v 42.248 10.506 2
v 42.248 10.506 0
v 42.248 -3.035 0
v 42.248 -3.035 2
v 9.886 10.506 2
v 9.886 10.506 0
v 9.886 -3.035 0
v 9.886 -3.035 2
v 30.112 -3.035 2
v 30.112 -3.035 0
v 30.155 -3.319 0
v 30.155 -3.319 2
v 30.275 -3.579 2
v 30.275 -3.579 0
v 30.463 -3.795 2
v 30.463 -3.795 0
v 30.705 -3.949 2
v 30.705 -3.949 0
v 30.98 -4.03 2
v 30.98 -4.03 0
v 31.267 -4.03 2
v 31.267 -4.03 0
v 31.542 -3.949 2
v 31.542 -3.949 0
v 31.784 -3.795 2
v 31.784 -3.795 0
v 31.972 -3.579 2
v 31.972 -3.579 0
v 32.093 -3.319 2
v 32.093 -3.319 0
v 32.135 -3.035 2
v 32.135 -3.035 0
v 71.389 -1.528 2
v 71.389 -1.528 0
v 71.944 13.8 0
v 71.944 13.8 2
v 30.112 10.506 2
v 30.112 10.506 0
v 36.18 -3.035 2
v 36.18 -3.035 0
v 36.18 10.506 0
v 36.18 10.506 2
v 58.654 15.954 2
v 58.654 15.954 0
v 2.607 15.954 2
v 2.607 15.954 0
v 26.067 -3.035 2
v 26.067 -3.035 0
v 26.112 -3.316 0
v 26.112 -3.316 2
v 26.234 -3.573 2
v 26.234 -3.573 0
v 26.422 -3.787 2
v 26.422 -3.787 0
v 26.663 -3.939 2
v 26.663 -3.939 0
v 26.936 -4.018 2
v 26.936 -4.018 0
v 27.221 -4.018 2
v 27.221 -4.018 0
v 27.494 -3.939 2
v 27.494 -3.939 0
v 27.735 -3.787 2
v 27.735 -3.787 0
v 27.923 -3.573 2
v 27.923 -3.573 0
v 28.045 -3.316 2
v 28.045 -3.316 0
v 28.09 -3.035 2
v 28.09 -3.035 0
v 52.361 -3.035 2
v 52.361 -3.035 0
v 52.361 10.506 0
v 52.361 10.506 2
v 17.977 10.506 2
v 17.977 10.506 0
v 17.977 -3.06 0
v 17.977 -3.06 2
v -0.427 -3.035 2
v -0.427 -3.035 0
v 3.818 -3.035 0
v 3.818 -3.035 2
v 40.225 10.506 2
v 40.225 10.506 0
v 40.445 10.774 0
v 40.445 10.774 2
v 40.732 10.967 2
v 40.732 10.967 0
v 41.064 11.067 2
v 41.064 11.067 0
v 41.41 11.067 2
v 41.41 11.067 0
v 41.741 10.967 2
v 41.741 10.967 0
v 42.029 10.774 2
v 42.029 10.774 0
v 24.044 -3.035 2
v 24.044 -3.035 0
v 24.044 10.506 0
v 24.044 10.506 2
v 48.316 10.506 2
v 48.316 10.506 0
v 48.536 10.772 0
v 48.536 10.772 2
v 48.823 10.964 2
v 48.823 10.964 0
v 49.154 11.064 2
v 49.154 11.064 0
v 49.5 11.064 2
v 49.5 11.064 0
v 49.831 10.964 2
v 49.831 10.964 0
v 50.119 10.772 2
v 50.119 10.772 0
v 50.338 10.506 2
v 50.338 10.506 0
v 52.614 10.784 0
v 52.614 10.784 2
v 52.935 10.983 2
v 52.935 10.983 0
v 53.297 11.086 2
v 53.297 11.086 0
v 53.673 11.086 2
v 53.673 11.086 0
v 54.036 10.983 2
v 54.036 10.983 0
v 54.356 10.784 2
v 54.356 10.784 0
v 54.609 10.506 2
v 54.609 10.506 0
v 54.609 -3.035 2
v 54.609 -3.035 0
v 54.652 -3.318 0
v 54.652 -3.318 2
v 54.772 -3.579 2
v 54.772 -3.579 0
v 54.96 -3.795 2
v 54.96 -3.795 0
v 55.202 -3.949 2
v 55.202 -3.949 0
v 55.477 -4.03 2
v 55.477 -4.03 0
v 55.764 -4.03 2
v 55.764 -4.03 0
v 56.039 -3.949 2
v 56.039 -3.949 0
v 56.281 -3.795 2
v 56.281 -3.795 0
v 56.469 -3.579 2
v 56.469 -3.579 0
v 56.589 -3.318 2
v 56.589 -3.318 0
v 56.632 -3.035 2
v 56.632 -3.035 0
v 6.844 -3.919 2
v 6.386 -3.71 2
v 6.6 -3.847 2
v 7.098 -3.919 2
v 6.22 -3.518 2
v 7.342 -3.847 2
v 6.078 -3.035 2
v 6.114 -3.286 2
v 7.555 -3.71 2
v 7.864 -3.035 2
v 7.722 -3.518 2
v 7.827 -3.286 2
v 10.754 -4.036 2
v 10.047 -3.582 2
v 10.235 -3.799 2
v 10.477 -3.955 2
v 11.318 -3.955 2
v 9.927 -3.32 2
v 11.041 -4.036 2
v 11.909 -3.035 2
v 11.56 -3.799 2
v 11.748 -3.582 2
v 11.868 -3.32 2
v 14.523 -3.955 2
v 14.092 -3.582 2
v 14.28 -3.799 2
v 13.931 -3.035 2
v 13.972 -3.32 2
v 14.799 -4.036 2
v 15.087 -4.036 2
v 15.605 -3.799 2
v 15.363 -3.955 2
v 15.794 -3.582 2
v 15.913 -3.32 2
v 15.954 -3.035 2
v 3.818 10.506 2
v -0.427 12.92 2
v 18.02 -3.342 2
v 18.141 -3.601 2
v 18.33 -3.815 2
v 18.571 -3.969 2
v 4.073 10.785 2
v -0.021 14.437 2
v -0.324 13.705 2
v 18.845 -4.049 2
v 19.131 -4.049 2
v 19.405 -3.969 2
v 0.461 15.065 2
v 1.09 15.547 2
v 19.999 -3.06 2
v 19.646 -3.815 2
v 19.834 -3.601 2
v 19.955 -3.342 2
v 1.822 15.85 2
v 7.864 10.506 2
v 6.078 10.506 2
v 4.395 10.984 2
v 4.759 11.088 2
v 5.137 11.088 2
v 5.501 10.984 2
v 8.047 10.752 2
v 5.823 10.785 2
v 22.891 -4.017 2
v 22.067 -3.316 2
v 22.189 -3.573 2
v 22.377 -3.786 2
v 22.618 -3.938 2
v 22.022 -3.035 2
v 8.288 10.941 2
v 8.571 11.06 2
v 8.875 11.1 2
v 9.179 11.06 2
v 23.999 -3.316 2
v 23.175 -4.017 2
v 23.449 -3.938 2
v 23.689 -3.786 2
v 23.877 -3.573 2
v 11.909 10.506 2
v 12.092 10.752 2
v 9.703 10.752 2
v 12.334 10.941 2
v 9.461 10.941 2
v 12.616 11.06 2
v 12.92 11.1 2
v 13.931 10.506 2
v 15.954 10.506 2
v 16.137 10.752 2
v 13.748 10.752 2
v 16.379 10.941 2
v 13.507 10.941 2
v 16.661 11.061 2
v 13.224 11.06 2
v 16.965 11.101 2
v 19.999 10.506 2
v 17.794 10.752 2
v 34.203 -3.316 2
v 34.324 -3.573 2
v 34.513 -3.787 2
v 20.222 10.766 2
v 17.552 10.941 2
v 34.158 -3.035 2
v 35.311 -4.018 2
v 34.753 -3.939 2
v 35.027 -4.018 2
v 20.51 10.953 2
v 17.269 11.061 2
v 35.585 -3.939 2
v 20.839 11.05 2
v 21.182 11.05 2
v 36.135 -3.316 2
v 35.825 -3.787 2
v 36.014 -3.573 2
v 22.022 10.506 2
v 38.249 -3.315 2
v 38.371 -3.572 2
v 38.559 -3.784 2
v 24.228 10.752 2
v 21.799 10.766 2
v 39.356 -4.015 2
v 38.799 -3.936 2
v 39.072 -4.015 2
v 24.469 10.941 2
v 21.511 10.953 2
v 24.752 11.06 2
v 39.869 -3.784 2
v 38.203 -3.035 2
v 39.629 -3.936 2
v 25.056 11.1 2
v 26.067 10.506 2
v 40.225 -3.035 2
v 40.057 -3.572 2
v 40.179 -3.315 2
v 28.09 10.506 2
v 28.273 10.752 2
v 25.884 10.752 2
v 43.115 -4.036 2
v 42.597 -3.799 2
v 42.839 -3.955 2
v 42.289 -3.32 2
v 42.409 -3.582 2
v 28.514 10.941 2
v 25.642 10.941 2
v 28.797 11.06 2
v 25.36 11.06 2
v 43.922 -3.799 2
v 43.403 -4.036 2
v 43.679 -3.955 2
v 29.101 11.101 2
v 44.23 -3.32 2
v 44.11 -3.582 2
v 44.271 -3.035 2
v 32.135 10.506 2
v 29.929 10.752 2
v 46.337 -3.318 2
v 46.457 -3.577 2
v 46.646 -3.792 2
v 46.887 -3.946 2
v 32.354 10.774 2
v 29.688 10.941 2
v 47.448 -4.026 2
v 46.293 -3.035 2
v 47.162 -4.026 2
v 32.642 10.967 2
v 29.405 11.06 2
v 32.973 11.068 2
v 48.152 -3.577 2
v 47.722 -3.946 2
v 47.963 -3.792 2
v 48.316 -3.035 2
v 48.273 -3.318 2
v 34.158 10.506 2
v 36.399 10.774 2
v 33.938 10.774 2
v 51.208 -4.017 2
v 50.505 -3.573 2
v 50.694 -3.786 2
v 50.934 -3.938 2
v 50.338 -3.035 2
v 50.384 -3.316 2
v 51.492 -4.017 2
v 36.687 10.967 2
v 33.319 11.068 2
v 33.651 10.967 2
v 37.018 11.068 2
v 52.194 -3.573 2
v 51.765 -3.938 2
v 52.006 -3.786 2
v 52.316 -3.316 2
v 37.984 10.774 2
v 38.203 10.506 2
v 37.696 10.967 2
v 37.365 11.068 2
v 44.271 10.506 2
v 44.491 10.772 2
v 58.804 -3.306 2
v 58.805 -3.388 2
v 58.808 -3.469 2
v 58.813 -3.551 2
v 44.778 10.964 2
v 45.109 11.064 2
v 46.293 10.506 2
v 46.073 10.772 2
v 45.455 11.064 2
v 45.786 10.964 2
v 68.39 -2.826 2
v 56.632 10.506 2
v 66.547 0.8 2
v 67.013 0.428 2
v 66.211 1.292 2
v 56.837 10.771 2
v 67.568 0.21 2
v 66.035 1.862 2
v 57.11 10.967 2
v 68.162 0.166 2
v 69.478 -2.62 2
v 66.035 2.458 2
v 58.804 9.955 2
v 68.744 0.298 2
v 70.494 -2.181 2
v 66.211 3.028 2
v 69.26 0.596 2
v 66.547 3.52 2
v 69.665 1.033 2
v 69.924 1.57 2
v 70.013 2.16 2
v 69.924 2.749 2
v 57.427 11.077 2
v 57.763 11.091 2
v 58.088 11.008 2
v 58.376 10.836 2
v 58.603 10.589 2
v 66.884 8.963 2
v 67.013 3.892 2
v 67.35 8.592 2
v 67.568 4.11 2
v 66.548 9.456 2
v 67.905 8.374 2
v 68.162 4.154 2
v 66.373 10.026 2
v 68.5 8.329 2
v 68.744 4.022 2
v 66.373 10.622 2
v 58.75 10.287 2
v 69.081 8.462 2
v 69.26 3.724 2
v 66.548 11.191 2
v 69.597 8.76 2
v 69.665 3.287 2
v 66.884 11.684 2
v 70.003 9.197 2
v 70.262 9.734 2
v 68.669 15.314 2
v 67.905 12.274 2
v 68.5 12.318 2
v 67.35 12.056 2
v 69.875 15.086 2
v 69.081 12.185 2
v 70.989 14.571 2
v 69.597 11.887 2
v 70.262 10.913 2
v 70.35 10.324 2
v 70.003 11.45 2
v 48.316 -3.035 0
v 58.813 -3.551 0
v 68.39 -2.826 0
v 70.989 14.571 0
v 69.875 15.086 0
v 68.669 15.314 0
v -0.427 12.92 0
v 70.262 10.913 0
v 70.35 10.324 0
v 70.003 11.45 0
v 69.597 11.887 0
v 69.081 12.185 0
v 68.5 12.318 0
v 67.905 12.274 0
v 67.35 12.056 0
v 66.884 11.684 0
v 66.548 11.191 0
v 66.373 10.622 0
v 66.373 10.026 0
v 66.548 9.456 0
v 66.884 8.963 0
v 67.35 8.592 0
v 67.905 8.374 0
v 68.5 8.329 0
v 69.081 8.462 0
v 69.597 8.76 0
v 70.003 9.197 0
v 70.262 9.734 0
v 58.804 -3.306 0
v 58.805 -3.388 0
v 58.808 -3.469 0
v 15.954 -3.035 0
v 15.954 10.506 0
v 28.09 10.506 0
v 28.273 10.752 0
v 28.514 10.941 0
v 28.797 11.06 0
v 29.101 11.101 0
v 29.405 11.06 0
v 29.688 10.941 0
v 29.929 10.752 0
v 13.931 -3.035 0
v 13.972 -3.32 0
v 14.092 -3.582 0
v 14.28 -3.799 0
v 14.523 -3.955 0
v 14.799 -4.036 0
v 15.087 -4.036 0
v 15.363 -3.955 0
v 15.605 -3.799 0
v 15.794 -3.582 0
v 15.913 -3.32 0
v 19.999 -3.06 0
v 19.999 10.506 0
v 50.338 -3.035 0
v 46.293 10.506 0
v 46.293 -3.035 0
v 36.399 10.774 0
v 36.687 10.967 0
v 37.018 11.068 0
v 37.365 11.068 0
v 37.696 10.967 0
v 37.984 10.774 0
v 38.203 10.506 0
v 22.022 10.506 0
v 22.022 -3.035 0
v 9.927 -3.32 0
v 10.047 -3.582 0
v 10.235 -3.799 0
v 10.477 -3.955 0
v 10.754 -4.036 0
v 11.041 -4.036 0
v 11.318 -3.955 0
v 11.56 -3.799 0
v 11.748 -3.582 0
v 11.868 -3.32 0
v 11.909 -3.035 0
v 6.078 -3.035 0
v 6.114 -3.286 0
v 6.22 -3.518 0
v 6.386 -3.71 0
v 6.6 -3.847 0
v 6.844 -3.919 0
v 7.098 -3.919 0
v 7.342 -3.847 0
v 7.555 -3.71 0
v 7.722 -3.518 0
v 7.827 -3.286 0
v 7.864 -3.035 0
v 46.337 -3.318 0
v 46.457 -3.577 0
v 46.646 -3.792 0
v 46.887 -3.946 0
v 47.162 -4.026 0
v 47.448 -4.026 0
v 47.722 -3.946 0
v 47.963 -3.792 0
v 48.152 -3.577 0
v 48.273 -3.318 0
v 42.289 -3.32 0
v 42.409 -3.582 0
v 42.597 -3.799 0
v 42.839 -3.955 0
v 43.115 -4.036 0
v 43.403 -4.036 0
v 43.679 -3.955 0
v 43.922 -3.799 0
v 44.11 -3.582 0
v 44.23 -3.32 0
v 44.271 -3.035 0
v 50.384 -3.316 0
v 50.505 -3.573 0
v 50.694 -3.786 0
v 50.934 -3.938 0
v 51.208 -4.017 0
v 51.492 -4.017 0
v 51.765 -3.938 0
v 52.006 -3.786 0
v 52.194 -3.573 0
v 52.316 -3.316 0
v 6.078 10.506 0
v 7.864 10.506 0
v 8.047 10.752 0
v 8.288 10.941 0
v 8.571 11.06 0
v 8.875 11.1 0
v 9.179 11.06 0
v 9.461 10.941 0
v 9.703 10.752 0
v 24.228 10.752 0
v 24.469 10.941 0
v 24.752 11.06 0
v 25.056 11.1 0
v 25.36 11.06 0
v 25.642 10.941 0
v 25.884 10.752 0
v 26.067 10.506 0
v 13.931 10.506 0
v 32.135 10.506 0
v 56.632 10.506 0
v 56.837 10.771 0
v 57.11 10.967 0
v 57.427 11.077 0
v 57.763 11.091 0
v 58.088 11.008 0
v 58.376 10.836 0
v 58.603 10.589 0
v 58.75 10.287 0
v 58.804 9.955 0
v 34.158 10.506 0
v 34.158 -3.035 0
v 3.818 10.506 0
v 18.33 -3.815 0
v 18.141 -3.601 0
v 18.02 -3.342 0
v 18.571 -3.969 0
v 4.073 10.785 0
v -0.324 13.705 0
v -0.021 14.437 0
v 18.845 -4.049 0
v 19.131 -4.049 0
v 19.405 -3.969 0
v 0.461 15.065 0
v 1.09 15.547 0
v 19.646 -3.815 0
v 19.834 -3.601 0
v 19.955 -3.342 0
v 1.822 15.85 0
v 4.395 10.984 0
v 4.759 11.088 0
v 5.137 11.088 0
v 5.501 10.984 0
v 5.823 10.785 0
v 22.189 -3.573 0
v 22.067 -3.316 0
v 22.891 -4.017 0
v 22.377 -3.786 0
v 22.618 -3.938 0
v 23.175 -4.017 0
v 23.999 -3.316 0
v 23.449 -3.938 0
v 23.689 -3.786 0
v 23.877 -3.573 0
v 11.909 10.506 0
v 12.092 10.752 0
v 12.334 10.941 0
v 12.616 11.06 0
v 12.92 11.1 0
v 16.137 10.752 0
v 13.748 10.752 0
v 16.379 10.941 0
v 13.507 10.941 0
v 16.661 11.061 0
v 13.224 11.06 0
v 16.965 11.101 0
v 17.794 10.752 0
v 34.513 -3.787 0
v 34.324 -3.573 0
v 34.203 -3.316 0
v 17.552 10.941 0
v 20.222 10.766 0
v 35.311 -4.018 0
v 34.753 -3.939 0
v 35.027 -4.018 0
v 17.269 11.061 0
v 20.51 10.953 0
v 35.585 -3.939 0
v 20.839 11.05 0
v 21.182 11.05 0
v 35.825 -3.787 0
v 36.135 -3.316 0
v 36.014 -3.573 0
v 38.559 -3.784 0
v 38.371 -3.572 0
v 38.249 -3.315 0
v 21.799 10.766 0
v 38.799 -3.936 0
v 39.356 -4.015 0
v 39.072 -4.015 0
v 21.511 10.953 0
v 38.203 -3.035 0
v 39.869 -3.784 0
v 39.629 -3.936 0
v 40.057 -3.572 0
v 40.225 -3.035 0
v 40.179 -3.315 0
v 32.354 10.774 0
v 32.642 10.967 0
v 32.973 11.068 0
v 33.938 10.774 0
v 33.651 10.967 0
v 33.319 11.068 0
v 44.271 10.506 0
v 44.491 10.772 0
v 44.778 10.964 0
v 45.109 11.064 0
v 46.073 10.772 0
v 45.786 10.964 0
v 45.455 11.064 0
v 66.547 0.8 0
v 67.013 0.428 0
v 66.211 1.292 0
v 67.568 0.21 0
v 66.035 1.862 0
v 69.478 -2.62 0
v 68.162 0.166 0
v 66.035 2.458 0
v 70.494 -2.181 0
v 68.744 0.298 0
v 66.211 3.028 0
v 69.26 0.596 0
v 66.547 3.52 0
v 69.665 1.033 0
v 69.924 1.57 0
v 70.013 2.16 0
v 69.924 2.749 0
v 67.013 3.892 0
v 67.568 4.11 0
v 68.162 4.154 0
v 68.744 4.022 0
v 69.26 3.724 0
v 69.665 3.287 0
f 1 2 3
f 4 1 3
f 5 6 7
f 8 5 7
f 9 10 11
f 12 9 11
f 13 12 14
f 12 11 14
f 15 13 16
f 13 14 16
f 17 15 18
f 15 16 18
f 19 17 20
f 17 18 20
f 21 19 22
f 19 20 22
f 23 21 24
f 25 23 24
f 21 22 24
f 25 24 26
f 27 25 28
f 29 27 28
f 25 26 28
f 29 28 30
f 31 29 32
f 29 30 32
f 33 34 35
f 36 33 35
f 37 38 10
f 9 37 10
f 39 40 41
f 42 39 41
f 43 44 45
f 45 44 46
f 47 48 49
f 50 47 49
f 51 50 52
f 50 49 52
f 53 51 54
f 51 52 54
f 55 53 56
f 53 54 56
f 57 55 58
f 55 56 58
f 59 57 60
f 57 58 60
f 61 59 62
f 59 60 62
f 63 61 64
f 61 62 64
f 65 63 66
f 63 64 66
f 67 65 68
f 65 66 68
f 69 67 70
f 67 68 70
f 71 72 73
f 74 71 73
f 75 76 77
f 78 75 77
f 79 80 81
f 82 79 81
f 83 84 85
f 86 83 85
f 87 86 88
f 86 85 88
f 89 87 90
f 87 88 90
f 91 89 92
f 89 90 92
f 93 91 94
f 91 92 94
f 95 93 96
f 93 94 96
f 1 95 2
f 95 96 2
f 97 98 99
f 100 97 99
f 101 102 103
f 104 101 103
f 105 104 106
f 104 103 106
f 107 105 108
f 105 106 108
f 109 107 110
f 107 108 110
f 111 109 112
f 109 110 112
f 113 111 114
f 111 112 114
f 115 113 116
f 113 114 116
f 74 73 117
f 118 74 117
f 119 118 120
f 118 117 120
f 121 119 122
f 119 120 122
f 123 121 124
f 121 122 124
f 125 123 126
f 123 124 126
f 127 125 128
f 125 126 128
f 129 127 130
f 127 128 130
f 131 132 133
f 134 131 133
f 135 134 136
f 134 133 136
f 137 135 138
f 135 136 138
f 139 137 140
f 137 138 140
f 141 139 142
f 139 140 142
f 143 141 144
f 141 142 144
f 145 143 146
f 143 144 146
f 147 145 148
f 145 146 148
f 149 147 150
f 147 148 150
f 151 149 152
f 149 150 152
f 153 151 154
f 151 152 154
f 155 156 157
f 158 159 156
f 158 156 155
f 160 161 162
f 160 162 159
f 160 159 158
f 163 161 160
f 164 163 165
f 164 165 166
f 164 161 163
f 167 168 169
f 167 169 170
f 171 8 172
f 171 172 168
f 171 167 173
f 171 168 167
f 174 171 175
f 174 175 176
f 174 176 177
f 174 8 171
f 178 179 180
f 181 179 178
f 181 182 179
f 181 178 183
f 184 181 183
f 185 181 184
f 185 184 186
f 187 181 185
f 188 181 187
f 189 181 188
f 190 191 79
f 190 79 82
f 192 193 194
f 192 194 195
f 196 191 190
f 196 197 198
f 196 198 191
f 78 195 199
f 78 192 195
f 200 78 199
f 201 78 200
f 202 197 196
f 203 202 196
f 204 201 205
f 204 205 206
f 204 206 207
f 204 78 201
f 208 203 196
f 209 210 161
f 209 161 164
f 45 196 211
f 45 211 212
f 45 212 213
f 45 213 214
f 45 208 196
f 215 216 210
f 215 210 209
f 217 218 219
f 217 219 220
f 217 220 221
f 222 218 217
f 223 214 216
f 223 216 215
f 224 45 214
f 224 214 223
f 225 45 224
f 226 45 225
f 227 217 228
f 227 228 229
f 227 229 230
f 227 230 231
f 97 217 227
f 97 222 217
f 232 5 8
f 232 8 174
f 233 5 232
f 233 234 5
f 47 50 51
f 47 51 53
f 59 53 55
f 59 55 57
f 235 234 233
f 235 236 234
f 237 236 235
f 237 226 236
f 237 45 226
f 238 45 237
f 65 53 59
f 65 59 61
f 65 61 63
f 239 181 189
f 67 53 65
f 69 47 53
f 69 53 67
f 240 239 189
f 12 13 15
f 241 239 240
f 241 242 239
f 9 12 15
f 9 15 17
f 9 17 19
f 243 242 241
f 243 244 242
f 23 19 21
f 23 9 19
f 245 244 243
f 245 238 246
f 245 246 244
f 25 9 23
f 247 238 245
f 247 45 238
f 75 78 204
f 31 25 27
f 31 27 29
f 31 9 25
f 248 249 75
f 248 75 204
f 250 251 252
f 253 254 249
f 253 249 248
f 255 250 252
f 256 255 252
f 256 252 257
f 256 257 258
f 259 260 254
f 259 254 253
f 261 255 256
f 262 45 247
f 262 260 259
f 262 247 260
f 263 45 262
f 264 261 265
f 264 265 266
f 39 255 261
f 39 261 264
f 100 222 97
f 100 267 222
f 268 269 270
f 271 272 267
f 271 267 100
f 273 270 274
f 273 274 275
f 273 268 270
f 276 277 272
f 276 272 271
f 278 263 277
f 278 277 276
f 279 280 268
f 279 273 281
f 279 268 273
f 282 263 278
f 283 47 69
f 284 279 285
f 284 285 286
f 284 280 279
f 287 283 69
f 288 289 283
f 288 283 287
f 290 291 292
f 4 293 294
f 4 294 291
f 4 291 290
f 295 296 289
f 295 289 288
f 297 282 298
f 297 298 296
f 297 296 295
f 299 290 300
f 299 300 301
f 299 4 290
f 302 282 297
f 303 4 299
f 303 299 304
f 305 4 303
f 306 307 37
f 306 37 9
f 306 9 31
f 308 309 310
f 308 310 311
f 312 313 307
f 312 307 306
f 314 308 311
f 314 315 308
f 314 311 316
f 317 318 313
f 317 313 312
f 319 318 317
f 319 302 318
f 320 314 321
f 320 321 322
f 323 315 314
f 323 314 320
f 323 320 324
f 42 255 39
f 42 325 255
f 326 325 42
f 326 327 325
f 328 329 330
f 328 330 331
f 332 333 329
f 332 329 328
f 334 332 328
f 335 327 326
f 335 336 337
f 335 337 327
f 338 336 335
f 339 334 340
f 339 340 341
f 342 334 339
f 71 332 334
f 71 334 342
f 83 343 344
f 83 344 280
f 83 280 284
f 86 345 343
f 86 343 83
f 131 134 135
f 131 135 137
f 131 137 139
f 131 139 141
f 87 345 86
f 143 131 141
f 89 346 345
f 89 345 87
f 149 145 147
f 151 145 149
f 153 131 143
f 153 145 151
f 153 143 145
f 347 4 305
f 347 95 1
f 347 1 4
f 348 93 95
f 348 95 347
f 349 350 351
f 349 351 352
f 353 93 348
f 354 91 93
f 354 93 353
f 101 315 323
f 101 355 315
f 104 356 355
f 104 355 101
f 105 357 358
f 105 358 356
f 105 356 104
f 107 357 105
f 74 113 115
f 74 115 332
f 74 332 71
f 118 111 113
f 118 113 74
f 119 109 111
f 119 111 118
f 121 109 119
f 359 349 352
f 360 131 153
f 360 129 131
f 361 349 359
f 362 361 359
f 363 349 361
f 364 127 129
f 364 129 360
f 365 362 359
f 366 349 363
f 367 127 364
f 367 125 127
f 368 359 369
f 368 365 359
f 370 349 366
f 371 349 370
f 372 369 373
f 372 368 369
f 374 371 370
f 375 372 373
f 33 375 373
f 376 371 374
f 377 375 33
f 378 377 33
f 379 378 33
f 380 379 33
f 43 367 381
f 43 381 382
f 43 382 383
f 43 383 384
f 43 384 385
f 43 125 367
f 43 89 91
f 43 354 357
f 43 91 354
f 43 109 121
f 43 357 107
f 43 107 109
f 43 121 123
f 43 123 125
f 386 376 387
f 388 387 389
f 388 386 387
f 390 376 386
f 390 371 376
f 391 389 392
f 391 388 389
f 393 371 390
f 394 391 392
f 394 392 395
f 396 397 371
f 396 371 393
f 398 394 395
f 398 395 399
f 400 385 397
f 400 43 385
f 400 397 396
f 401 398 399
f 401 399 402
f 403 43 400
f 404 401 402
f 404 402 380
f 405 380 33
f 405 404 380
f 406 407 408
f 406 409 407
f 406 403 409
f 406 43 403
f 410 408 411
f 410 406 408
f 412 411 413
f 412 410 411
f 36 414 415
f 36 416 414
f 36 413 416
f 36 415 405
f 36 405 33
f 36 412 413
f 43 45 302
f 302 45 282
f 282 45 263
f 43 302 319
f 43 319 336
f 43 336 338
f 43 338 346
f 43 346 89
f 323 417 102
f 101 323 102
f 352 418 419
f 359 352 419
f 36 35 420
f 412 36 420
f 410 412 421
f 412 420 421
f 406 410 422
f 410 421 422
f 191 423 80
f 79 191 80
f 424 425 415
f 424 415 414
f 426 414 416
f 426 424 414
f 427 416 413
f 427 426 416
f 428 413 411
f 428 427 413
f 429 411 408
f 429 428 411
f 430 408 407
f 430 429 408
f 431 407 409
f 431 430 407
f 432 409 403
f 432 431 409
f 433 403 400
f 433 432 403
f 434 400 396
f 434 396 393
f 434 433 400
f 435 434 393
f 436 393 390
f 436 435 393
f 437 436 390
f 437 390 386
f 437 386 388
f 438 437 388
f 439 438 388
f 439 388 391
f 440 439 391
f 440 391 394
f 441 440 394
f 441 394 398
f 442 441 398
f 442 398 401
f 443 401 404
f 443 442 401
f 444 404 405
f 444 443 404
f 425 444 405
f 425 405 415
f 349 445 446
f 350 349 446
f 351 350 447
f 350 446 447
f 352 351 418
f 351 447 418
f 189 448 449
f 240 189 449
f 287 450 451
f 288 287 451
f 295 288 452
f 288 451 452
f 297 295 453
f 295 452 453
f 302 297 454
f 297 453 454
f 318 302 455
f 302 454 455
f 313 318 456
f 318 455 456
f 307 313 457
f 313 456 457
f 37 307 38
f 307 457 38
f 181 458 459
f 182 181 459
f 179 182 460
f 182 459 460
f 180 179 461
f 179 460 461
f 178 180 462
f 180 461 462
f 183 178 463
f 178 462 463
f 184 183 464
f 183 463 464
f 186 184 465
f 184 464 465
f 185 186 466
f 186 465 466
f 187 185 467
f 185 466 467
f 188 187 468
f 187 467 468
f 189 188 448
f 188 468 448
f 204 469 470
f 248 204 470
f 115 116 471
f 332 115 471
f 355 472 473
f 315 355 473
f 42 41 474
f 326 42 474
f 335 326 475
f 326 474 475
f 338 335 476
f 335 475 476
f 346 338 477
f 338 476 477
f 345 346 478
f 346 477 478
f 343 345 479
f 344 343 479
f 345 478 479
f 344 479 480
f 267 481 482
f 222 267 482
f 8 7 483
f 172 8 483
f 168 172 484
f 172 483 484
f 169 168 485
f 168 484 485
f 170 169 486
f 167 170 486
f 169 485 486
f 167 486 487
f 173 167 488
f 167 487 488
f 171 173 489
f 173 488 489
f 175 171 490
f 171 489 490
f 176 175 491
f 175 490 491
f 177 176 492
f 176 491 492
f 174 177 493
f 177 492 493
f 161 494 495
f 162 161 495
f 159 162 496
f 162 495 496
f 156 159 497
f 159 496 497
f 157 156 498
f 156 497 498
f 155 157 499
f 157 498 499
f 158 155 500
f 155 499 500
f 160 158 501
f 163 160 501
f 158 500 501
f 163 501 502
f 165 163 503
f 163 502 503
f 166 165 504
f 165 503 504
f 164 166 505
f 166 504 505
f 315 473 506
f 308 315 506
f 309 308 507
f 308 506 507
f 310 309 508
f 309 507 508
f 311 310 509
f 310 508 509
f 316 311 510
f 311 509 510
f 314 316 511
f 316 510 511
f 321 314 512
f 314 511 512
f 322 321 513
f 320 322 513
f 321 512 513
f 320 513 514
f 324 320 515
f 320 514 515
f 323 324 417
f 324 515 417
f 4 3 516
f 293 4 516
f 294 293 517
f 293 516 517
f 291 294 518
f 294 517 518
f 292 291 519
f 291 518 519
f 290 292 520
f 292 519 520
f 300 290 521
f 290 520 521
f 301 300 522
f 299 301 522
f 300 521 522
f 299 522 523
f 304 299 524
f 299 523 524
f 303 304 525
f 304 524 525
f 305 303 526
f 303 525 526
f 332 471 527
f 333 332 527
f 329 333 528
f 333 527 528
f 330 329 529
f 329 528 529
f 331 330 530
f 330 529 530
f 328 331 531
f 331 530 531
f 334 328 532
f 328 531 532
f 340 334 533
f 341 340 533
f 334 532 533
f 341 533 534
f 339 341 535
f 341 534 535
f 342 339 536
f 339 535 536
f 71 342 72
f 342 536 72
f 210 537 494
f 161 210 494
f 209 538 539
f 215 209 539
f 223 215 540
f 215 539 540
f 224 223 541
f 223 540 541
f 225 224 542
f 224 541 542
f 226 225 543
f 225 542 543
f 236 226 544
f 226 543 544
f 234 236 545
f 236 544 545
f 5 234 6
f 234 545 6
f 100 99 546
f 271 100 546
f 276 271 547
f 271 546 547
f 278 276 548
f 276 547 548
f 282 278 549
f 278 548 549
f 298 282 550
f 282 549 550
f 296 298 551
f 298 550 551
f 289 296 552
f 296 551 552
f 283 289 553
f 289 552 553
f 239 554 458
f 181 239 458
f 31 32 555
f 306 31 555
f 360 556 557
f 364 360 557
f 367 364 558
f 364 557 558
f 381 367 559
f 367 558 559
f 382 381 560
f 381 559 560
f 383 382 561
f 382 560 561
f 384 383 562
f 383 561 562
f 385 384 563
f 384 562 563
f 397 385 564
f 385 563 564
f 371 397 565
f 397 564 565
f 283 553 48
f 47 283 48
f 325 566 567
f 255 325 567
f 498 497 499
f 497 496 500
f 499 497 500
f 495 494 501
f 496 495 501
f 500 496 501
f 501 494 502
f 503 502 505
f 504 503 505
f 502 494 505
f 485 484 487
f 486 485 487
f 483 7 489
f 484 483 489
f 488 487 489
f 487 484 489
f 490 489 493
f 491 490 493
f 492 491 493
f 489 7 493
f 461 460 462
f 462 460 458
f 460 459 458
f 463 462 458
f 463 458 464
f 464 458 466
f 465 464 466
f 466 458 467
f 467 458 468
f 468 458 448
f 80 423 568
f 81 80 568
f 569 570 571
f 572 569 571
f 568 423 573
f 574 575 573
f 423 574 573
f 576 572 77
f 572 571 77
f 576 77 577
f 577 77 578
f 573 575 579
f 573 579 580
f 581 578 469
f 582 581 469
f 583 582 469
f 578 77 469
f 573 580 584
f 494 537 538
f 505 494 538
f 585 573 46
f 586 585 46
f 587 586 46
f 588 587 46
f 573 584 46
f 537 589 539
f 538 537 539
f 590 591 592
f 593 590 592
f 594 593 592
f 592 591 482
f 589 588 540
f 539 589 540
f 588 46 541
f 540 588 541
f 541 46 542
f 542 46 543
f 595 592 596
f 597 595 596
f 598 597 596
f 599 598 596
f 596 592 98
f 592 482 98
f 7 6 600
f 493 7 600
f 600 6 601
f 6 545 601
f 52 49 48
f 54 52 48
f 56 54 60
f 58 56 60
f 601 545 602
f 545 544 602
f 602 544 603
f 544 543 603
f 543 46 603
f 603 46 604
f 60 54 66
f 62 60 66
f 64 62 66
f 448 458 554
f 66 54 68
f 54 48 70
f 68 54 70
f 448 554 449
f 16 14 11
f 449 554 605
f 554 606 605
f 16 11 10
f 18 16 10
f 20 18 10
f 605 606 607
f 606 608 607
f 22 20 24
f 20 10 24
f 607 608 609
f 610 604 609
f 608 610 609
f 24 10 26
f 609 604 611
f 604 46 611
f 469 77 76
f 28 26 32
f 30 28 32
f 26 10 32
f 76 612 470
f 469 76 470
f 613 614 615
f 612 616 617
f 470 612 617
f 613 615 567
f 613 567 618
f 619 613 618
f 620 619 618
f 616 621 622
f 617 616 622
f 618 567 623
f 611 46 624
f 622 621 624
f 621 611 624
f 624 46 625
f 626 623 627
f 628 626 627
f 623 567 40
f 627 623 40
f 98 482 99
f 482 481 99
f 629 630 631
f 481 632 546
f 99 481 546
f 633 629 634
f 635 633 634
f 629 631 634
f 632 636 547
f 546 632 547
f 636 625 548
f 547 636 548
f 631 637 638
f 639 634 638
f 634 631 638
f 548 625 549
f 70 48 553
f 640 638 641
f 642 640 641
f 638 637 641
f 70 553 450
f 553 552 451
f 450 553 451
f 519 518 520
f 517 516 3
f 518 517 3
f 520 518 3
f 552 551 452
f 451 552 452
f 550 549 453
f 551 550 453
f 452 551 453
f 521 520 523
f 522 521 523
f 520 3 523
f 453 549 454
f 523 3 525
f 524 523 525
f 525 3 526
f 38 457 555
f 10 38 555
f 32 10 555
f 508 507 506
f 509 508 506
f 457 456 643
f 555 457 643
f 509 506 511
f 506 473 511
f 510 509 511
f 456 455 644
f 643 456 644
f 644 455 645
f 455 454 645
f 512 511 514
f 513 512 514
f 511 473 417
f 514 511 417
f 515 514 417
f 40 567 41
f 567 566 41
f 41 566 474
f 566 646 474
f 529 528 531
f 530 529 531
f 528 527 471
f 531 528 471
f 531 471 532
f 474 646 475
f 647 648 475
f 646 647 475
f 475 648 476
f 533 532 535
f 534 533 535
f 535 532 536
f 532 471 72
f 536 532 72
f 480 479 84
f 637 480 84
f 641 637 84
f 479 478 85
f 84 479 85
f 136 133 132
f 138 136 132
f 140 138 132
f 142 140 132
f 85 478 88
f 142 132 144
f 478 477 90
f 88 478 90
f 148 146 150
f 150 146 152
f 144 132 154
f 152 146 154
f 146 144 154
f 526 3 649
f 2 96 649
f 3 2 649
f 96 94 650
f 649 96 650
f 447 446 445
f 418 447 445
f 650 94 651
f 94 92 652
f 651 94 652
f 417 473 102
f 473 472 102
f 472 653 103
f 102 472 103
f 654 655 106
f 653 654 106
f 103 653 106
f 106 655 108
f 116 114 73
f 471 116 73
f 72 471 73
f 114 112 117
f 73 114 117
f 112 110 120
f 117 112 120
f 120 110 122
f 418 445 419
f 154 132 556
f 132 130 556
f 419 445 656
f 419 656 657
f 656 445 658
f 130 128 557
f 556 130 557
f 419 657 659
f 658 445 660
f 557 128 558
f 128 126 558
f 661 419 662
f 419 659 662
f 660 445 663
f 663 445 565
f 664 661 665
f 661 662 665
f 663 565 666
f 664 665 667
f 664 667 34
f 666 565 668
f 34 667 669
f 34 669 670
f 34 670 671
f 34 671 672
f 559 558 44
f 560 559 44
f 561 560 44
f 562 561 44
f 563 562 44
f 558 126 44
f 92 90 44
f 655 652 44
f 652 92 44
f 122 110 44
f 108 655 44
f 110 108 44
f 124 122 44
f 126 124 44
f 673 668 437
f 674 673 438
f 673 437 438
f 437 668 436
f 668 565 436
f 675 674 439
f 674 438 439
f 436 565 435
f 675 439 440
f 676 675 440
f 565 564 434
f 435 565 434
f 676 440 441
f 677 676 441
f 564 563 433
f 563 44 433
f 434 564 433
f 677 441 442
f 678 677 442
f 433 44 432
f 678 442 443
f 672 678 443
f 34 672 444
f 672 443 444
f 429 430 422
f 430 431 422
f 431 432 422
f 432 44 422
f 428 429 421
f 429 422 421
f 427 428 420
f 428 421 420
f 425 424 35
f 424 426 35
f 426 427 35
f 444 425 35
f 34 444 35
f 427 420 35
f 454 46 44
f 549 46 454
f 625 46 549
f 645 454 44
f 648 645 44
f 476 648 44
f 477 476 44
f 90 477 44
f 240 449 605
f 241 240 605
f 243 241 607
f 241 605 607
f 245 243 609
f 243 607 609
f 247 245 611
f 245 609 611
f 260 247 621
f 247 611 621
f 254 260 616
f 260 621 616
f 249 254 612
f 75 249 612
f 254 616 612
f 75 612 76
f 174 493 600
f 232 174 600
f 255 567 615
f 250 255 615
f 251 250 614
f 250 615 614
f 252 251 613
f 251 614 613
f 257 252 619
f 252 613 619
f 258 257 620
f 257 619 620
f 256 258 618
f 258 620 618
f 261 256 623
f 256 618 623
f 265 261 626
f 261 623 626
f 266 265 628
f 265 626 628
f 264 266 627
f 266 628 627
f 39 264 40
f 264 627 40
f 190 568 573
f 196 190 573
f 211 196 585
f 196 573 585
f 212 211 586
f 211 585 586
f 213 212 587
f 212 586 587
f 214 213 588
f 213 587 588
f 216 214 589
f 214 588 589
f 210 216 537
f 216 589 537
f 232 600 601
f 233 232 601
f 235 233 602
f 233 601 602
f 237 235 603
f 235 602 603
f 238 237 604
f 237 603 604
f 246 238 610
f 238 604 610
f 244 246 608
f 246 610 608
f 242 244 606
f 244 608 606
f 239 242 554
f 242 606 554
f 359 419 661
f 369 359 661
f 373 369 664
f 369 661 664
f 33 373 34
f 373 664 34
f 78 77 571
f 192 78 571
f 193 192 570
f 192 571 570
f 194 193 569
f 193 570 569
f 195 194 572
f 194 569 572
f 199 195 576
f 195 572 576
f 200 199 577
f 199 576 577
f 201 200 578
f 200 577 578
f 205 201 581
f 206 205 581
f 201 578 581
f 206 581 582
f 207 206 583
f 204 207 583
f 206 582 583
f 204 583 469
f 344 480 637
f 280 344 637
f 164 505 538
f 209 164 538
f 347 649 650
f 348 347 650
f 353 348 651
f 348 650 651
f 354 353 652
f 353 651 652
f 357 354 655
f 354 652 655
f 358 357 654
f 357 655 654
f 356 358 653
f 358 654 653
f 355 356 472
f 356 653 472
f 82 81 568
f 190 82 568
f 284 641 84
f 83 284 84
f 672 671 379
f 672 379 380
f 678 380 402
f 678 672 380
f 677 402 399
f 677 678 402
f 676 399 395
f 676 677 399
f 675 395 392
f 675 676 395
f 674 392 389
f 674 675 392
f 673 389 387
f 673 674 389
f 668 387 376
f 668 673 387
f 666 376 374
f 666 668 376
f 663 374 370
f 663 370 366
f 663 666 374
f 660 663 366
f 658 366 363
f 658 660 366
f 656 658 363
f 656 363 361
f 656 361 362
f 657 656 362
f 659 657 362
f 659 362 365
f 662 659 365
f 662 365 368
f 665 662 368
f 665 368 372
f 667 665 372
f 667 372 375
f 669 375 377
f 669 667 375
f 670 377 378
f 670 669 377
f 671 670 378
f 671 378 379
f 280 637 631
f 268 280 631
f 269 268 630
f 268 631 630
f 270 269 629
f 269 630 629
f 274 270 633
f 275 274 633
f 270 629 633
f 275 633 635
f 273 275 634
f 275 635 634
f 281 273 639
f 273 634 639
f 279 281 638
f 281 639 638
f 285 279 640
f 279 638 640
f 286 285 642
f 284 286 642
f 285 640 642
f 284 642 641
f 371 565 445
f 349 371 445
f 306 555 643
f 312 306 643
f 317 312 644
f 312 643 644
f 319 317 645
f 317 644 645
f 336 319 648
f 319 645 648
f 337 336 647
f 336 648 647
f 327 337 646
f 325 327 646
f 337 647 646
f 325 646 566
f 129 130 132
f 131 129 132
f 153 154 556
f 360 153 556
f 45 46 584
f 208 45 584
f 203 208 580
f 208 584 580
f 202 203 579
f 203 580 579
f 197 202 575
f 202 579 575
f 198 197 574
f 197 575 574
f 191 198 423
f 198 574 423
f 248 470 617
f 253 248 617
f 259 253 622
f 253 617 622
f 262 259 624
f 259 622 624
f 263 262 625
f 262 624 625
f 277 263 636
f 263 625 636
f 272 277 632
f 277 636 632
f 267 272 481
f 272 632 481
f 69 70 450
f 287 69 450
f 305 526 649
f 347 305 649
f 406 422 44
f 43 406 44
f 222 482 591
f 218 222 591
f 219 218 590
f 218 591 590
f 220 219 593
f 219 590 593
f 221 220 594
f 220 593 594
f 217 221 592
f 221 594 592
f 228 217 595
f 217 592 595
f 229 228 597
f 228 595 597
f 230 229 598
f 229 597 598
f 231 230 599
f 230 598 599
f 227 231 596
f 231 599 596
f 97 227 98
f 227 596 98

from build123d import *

# Parameters (mm, degrees)
F0_R     = 2
F1_DEPTH = 2


# Not quite as in the source:
# - a feature names something its author has since deleted; it is built from what else it names


with BuildPart() as f1:
    # F0 (on Top) → F1 (new body)
    with BuildSketch(Plane.XY):
        with BuildLine():
            Line((56.6317902379, -3.0349094544), (56.6317902379, 10.5057977874))
            ThreePointArc((56.6317902379, 10.5057977874), (57.9282334063, 11.0612910292), (58.8036425211, 9.955399302))
            Line((58.8036425211, 9.955399302), (58.8036425211, -3.3060063632))
            ThreePointArc((58.8036425211, -3.3060063632), (58.8059571474, -3.4285186947), (58.8128977225, -3.5508561677))
            Line((58.8128977225, -3.5508561677), (68.3904010917, -2.8257703951))
            ThreePointArc((68.3904010917, -2.8257703951), (69.9985927846, -2.4288509841), (71.3888536722, -1.5282954863))
            Line((71.3888536722, -1.5282954863), (71.9441100955, 13.8000454754))
            ThreePointArc((71.9441100955, 13.8000454754), (70.4479915869, 14.8624188349), (68.6693633039, 15.3135165823))
            Line((68.6693633039, 15.3135165823), (58.6544042145, 15.9537835574))
            Line((58.6544042145, 15.9537835574), (2.6067622363, 15.9537835574))
            ThreePointArc((2.6067622363, 15.9537835574), (0.4614561486, 15.0651686804), (-0.4271587284, 12.9198625927))
            Line((-0.4271587284, 12.9198625927), (-0.4271587284, -3.0349094544))
            Line((-0.4271587284, -3.0349094544), (3.8183579072, -3.0349094544))
            Line((3.8183579072, -3.0349094544), (3.8183579072, 2.3688513962))
            Line((3.8183579072, 2.3688513962), (3.8183579072, 10.5057977874))
            ThreePointArc((3.8183579072, 10.5057977874), (4.9481016159, 11.1006888991), (6.0778453246, 10.5057977874))
            Line((6.0778453246, 10.5057977874), (6.0778453246, 2.3688513962))
            Line((6.0778453246, 2.3688513962), (6.0778453246, -3.0349094544))
            ThreePointArc((6.0778453246, -3.0349094544), (6.9707155924, -3.9277797221), (7.8635858601, -3.0349094544))
            Line((7.8635858601, -3.0349094544), (7.8635858601, 2.3688513962))
            Line((7.8635858601, 2.3688513962), (7.8635858601, 10.5057977874))
            ThreePointArc((7.8635858601, 10.5057977874), (8.8748928484, 11.1003156957), (9.8861998366, 10.5057977874))
            Line((9.8861998366, 10.5057977874), (9.8861998366, 2.3688513962))
            Line((9.8861998366, 2.3688513962), (9.8861998366, -3.0349094544))
            ThreePointArc((9.8861998366, -3.0349094544), (10.8975068249, -4.0462164426), (11.9088138131, -3.0349094544))
            Line((11.9088138131, -3.0349094544), (11.9088138131, 2.3688513962))
            Line((11.9088138131, 2.3688513962), (11.9088138131, 10.5057977874))
            ThreePointArc((11.9088138131, 10.5057977874), (12.9201208014, 11.1003953408), (13.9314277896, 10.5057977874))
            Line((13.9314277896, 10.5057977874), (13.9314277896, 2.3688513962))
            Line((13.9314277896, 2.3688513962), (13.9314277896, -3.0349094544))
            ThreePointArc((13.9314277896, -3.0349094544), (14.9427347779, -4.0462164426), (15.9540417661, -3.0349094544))
            Line((15.9540417661, -3.0349094544), (15.9540417661, 2.3688513962))
            Line((15.9540417661, 2.3688513962), (15.9540417661, 10.5057977874))
            ThreePointArc((15.9540417661, 10.5057977874), (16.9653487543, 11.1012729968), (17.9766557426, 10.5057977874))
            Line((17.9766557426, 10.5057977874), (17.9766557426, -3.0349094544))
            Line((17.9766557426, -3.0349094544), (17.9766557426, -3.0600128507))
            ThreePointArc((17.9766557426, -3.0600128507), (18.987884836, -4.0587681408), (19.9991139294, -3.0600128507))
            Line((19.9991139294, -3.0600128507), (19.9991139294, -3.0349094544))
            Line((19.9991139294, -3.0349094544), (19.9991139294, 2.3688513962))
            Line((19.9991139294, 2.3688513962), (19.9991139294, 10.5057977874))
            ThreePointArc((19.9991139294, 10.5057977874), (21.0104988125, 11.0625593301), (22.0218836956, 10.5057977874))
            Line((22.0218836956, 10.5057977874), (22.0218836956, 2.3688513962))
            Line((22.0218836956, 2.3688513962), (22.0218836956, -3.0349094544))
            ThreePointArc((22.0218836956, -3.0349094544), (23.0331906838, -4.0270898738), (24.0444976721, -3.0349094544))
            Line((24.0444976721, -3.0349094544), (24.0444976721, 2.3688513962))
            Line((24.0444976721, 2.3688513962), (24.0444976721, 10.5057977874))
            ThreePointArc((24.0444976721, 10.5057977874), (25.0558046603, 11.1004906415), (26.0671116486, 10.5057977874))
            Line((26.0671116486, 10.5057977874), (26.0671116486, 2.3688513962))
            Line((26.0671116486, 2.3688513962), (26.0671116486, -3.0349094544))
            ThreePointArc((26.0671116486, -3.0349094544), (27.0784186368, -4.0282444578), (28.089725625, -3.0349094544))
            Line((28.089725625, -3.0349094544), (28.089725625, 2.3688513962))
            Line((28.089725625, 2.3688513962), (28.089725625, 10.5057977874))
            ThreePointArc((28.089725625, 10.5057977874), (29.1010326133, 11.1005861122), (30.1123396015, 10.5057977874))
            Line((30.1123396015, 10.5057977874), (30.1123396015, 2.3688513962))
            Line((30.1123396015, 2.3688513962), (30.1123396015, -3.0349094544))
            ThreePointArc((30.1123396015, -3.0349094544), (31.1236465898, -4.0401241658), (32.134953578, -3.0349094544))
            Line((32.134953578, -3.0349094544), (32.134953578, 2.3688513962))
            Line((32.134953578, 2.3688513962), (32.134953578, 10.5057977874))
            ThreePointArc((32.134953578, 10.5057977874), (33.1462605663, 11.0805944093), (34.1575675545, 10.5057977874))
            Line((34.1575675545, 10.5057977874), (34.1575675545, 2.3688513962))
            Line((34.1575675545, 2.3688513962), (34.1575675545, -3.0349094544))
            ThreePointArc((34.1575675545, -3.0349094544), (35.1688745428, -4.0284589293), (36.180181531, -3.0349094544))
            Line((36.180181531, -3.0349094544), (36.180181531, 2.3688513962))
            Line((36.180181531, 2.3688513962), (36.180181531, 10.5057977874))
            ThreePointArc((36.180181531, 10.5057977874), (37.1914885192, 11.0806196167), (38.2027955075, 10.5057977874))
            Line((38.2027955075, 10.5057977874), (38.2027955075, 2.3688513962))
            Line((38.2027955075, 2.3688513962), (38.2027955075, -3.0349094544))
            ThreePointArc((38.2027955075, -3.0349094544), (39.2141024957, -4.0246480782), (40.225409484, -3.0349094544))
            Line((40.225409484, -3.0349094544), (40.225409484, 2.3688513962))
            Line((40.225409484, 2.3688513962), (40.225409484, 10.5057977874))
            ThreePointArc((40.225409484, 10.5057977874), (41.2367164722, 11.0799992786), (42.2480234605, 10.5057977874))
            Line((42.2480234605, 10.5057977874), (42.2480234605, 2.3688513962))
            Line((42.2480234605, 2.3688513962), (42.2480234605, -3.0349094544))
            ThreePointArc((42.2480234605, -3.0349094544), (43.2593304487, -4.0462164426), (44.270637437, -3.0349094544))
            Line((44.270637437, -3.0349094544), (44.270637437, 2.3688513962))
            Line((44.270637437, 2.3688513962), (44.270637437, 10.5057977874))
            ThreePointArc((44.270637437, 10.5057977874), (45.2819444252, 11.0763000676), (46.2932514135, 10.5057977874))
            Line((46.2932514135, 10.5057977874), (46.2932514135, 2.3688513962))
            Line((46.2932514135, 2.3688513962), (46.2932514135, -3.0349094544))
            ThreePointArc((46.2932514135, -3.0349094544), (47.3045584017, -4.0362897846), (48.3158653899, -3.0349094544))
            Line((48.3158653899, -3.0349094544), (48.3158653899, 2.3688513962))
            Line((48.3158653899, 2.3688513962), (48.3158653899, 10.5057977874))
            ThreePointArc((48.3158653899, 10.5057977874), (49.3271723782, 11.0768378201), (50.3384793664, 10.5057977874))
            Line((50.3384793664, 10.5057977874), (50.3384793664, 2.3688513962))
            Line((50.3384793664, 2.3688513962), (50.3384793664, -3.0349094544))
            ThreePointArc((50.3384793664, -3.0349094544), (51.3497863547, -4.0273604844), (52.3610933429, -3.0349094544))
            Line((52.3610933429, -3.0349094544), (52.3610933429, 2.3688513962))
            Line((52.3610933429, 2.3688513962), (52.3610933429, 10.5057977874))
            ThreePointArc((52.3610933429, 10.5057977874), (53.4851541573, 11.0994017223), (54.6092149717, 10.5057977874))
            Line((54.6092149717, 10.5057977874), (54.6092149717, 2.3688513962))
            Line((54.6092149717, 2.3688513962), (54.6092149717, -3.0349094544))
            ThreePointArc((54.6092149717, -3.0349094544), (55.6205026048, -4.039959639), (56.6317902379, -3.0349094544))
        make_face()
        with Locations((68.012945354, 2.1599619649)):
            Circle(F0_R, mode=Mode.SUBTRACT)
        with Locations((68.3503592405, 10.3237033185)):
            Circle(F0_R, mode=Mode.SUBTRACT)
    extrude(amount=F1_DEPTH)


solid = f1.part
